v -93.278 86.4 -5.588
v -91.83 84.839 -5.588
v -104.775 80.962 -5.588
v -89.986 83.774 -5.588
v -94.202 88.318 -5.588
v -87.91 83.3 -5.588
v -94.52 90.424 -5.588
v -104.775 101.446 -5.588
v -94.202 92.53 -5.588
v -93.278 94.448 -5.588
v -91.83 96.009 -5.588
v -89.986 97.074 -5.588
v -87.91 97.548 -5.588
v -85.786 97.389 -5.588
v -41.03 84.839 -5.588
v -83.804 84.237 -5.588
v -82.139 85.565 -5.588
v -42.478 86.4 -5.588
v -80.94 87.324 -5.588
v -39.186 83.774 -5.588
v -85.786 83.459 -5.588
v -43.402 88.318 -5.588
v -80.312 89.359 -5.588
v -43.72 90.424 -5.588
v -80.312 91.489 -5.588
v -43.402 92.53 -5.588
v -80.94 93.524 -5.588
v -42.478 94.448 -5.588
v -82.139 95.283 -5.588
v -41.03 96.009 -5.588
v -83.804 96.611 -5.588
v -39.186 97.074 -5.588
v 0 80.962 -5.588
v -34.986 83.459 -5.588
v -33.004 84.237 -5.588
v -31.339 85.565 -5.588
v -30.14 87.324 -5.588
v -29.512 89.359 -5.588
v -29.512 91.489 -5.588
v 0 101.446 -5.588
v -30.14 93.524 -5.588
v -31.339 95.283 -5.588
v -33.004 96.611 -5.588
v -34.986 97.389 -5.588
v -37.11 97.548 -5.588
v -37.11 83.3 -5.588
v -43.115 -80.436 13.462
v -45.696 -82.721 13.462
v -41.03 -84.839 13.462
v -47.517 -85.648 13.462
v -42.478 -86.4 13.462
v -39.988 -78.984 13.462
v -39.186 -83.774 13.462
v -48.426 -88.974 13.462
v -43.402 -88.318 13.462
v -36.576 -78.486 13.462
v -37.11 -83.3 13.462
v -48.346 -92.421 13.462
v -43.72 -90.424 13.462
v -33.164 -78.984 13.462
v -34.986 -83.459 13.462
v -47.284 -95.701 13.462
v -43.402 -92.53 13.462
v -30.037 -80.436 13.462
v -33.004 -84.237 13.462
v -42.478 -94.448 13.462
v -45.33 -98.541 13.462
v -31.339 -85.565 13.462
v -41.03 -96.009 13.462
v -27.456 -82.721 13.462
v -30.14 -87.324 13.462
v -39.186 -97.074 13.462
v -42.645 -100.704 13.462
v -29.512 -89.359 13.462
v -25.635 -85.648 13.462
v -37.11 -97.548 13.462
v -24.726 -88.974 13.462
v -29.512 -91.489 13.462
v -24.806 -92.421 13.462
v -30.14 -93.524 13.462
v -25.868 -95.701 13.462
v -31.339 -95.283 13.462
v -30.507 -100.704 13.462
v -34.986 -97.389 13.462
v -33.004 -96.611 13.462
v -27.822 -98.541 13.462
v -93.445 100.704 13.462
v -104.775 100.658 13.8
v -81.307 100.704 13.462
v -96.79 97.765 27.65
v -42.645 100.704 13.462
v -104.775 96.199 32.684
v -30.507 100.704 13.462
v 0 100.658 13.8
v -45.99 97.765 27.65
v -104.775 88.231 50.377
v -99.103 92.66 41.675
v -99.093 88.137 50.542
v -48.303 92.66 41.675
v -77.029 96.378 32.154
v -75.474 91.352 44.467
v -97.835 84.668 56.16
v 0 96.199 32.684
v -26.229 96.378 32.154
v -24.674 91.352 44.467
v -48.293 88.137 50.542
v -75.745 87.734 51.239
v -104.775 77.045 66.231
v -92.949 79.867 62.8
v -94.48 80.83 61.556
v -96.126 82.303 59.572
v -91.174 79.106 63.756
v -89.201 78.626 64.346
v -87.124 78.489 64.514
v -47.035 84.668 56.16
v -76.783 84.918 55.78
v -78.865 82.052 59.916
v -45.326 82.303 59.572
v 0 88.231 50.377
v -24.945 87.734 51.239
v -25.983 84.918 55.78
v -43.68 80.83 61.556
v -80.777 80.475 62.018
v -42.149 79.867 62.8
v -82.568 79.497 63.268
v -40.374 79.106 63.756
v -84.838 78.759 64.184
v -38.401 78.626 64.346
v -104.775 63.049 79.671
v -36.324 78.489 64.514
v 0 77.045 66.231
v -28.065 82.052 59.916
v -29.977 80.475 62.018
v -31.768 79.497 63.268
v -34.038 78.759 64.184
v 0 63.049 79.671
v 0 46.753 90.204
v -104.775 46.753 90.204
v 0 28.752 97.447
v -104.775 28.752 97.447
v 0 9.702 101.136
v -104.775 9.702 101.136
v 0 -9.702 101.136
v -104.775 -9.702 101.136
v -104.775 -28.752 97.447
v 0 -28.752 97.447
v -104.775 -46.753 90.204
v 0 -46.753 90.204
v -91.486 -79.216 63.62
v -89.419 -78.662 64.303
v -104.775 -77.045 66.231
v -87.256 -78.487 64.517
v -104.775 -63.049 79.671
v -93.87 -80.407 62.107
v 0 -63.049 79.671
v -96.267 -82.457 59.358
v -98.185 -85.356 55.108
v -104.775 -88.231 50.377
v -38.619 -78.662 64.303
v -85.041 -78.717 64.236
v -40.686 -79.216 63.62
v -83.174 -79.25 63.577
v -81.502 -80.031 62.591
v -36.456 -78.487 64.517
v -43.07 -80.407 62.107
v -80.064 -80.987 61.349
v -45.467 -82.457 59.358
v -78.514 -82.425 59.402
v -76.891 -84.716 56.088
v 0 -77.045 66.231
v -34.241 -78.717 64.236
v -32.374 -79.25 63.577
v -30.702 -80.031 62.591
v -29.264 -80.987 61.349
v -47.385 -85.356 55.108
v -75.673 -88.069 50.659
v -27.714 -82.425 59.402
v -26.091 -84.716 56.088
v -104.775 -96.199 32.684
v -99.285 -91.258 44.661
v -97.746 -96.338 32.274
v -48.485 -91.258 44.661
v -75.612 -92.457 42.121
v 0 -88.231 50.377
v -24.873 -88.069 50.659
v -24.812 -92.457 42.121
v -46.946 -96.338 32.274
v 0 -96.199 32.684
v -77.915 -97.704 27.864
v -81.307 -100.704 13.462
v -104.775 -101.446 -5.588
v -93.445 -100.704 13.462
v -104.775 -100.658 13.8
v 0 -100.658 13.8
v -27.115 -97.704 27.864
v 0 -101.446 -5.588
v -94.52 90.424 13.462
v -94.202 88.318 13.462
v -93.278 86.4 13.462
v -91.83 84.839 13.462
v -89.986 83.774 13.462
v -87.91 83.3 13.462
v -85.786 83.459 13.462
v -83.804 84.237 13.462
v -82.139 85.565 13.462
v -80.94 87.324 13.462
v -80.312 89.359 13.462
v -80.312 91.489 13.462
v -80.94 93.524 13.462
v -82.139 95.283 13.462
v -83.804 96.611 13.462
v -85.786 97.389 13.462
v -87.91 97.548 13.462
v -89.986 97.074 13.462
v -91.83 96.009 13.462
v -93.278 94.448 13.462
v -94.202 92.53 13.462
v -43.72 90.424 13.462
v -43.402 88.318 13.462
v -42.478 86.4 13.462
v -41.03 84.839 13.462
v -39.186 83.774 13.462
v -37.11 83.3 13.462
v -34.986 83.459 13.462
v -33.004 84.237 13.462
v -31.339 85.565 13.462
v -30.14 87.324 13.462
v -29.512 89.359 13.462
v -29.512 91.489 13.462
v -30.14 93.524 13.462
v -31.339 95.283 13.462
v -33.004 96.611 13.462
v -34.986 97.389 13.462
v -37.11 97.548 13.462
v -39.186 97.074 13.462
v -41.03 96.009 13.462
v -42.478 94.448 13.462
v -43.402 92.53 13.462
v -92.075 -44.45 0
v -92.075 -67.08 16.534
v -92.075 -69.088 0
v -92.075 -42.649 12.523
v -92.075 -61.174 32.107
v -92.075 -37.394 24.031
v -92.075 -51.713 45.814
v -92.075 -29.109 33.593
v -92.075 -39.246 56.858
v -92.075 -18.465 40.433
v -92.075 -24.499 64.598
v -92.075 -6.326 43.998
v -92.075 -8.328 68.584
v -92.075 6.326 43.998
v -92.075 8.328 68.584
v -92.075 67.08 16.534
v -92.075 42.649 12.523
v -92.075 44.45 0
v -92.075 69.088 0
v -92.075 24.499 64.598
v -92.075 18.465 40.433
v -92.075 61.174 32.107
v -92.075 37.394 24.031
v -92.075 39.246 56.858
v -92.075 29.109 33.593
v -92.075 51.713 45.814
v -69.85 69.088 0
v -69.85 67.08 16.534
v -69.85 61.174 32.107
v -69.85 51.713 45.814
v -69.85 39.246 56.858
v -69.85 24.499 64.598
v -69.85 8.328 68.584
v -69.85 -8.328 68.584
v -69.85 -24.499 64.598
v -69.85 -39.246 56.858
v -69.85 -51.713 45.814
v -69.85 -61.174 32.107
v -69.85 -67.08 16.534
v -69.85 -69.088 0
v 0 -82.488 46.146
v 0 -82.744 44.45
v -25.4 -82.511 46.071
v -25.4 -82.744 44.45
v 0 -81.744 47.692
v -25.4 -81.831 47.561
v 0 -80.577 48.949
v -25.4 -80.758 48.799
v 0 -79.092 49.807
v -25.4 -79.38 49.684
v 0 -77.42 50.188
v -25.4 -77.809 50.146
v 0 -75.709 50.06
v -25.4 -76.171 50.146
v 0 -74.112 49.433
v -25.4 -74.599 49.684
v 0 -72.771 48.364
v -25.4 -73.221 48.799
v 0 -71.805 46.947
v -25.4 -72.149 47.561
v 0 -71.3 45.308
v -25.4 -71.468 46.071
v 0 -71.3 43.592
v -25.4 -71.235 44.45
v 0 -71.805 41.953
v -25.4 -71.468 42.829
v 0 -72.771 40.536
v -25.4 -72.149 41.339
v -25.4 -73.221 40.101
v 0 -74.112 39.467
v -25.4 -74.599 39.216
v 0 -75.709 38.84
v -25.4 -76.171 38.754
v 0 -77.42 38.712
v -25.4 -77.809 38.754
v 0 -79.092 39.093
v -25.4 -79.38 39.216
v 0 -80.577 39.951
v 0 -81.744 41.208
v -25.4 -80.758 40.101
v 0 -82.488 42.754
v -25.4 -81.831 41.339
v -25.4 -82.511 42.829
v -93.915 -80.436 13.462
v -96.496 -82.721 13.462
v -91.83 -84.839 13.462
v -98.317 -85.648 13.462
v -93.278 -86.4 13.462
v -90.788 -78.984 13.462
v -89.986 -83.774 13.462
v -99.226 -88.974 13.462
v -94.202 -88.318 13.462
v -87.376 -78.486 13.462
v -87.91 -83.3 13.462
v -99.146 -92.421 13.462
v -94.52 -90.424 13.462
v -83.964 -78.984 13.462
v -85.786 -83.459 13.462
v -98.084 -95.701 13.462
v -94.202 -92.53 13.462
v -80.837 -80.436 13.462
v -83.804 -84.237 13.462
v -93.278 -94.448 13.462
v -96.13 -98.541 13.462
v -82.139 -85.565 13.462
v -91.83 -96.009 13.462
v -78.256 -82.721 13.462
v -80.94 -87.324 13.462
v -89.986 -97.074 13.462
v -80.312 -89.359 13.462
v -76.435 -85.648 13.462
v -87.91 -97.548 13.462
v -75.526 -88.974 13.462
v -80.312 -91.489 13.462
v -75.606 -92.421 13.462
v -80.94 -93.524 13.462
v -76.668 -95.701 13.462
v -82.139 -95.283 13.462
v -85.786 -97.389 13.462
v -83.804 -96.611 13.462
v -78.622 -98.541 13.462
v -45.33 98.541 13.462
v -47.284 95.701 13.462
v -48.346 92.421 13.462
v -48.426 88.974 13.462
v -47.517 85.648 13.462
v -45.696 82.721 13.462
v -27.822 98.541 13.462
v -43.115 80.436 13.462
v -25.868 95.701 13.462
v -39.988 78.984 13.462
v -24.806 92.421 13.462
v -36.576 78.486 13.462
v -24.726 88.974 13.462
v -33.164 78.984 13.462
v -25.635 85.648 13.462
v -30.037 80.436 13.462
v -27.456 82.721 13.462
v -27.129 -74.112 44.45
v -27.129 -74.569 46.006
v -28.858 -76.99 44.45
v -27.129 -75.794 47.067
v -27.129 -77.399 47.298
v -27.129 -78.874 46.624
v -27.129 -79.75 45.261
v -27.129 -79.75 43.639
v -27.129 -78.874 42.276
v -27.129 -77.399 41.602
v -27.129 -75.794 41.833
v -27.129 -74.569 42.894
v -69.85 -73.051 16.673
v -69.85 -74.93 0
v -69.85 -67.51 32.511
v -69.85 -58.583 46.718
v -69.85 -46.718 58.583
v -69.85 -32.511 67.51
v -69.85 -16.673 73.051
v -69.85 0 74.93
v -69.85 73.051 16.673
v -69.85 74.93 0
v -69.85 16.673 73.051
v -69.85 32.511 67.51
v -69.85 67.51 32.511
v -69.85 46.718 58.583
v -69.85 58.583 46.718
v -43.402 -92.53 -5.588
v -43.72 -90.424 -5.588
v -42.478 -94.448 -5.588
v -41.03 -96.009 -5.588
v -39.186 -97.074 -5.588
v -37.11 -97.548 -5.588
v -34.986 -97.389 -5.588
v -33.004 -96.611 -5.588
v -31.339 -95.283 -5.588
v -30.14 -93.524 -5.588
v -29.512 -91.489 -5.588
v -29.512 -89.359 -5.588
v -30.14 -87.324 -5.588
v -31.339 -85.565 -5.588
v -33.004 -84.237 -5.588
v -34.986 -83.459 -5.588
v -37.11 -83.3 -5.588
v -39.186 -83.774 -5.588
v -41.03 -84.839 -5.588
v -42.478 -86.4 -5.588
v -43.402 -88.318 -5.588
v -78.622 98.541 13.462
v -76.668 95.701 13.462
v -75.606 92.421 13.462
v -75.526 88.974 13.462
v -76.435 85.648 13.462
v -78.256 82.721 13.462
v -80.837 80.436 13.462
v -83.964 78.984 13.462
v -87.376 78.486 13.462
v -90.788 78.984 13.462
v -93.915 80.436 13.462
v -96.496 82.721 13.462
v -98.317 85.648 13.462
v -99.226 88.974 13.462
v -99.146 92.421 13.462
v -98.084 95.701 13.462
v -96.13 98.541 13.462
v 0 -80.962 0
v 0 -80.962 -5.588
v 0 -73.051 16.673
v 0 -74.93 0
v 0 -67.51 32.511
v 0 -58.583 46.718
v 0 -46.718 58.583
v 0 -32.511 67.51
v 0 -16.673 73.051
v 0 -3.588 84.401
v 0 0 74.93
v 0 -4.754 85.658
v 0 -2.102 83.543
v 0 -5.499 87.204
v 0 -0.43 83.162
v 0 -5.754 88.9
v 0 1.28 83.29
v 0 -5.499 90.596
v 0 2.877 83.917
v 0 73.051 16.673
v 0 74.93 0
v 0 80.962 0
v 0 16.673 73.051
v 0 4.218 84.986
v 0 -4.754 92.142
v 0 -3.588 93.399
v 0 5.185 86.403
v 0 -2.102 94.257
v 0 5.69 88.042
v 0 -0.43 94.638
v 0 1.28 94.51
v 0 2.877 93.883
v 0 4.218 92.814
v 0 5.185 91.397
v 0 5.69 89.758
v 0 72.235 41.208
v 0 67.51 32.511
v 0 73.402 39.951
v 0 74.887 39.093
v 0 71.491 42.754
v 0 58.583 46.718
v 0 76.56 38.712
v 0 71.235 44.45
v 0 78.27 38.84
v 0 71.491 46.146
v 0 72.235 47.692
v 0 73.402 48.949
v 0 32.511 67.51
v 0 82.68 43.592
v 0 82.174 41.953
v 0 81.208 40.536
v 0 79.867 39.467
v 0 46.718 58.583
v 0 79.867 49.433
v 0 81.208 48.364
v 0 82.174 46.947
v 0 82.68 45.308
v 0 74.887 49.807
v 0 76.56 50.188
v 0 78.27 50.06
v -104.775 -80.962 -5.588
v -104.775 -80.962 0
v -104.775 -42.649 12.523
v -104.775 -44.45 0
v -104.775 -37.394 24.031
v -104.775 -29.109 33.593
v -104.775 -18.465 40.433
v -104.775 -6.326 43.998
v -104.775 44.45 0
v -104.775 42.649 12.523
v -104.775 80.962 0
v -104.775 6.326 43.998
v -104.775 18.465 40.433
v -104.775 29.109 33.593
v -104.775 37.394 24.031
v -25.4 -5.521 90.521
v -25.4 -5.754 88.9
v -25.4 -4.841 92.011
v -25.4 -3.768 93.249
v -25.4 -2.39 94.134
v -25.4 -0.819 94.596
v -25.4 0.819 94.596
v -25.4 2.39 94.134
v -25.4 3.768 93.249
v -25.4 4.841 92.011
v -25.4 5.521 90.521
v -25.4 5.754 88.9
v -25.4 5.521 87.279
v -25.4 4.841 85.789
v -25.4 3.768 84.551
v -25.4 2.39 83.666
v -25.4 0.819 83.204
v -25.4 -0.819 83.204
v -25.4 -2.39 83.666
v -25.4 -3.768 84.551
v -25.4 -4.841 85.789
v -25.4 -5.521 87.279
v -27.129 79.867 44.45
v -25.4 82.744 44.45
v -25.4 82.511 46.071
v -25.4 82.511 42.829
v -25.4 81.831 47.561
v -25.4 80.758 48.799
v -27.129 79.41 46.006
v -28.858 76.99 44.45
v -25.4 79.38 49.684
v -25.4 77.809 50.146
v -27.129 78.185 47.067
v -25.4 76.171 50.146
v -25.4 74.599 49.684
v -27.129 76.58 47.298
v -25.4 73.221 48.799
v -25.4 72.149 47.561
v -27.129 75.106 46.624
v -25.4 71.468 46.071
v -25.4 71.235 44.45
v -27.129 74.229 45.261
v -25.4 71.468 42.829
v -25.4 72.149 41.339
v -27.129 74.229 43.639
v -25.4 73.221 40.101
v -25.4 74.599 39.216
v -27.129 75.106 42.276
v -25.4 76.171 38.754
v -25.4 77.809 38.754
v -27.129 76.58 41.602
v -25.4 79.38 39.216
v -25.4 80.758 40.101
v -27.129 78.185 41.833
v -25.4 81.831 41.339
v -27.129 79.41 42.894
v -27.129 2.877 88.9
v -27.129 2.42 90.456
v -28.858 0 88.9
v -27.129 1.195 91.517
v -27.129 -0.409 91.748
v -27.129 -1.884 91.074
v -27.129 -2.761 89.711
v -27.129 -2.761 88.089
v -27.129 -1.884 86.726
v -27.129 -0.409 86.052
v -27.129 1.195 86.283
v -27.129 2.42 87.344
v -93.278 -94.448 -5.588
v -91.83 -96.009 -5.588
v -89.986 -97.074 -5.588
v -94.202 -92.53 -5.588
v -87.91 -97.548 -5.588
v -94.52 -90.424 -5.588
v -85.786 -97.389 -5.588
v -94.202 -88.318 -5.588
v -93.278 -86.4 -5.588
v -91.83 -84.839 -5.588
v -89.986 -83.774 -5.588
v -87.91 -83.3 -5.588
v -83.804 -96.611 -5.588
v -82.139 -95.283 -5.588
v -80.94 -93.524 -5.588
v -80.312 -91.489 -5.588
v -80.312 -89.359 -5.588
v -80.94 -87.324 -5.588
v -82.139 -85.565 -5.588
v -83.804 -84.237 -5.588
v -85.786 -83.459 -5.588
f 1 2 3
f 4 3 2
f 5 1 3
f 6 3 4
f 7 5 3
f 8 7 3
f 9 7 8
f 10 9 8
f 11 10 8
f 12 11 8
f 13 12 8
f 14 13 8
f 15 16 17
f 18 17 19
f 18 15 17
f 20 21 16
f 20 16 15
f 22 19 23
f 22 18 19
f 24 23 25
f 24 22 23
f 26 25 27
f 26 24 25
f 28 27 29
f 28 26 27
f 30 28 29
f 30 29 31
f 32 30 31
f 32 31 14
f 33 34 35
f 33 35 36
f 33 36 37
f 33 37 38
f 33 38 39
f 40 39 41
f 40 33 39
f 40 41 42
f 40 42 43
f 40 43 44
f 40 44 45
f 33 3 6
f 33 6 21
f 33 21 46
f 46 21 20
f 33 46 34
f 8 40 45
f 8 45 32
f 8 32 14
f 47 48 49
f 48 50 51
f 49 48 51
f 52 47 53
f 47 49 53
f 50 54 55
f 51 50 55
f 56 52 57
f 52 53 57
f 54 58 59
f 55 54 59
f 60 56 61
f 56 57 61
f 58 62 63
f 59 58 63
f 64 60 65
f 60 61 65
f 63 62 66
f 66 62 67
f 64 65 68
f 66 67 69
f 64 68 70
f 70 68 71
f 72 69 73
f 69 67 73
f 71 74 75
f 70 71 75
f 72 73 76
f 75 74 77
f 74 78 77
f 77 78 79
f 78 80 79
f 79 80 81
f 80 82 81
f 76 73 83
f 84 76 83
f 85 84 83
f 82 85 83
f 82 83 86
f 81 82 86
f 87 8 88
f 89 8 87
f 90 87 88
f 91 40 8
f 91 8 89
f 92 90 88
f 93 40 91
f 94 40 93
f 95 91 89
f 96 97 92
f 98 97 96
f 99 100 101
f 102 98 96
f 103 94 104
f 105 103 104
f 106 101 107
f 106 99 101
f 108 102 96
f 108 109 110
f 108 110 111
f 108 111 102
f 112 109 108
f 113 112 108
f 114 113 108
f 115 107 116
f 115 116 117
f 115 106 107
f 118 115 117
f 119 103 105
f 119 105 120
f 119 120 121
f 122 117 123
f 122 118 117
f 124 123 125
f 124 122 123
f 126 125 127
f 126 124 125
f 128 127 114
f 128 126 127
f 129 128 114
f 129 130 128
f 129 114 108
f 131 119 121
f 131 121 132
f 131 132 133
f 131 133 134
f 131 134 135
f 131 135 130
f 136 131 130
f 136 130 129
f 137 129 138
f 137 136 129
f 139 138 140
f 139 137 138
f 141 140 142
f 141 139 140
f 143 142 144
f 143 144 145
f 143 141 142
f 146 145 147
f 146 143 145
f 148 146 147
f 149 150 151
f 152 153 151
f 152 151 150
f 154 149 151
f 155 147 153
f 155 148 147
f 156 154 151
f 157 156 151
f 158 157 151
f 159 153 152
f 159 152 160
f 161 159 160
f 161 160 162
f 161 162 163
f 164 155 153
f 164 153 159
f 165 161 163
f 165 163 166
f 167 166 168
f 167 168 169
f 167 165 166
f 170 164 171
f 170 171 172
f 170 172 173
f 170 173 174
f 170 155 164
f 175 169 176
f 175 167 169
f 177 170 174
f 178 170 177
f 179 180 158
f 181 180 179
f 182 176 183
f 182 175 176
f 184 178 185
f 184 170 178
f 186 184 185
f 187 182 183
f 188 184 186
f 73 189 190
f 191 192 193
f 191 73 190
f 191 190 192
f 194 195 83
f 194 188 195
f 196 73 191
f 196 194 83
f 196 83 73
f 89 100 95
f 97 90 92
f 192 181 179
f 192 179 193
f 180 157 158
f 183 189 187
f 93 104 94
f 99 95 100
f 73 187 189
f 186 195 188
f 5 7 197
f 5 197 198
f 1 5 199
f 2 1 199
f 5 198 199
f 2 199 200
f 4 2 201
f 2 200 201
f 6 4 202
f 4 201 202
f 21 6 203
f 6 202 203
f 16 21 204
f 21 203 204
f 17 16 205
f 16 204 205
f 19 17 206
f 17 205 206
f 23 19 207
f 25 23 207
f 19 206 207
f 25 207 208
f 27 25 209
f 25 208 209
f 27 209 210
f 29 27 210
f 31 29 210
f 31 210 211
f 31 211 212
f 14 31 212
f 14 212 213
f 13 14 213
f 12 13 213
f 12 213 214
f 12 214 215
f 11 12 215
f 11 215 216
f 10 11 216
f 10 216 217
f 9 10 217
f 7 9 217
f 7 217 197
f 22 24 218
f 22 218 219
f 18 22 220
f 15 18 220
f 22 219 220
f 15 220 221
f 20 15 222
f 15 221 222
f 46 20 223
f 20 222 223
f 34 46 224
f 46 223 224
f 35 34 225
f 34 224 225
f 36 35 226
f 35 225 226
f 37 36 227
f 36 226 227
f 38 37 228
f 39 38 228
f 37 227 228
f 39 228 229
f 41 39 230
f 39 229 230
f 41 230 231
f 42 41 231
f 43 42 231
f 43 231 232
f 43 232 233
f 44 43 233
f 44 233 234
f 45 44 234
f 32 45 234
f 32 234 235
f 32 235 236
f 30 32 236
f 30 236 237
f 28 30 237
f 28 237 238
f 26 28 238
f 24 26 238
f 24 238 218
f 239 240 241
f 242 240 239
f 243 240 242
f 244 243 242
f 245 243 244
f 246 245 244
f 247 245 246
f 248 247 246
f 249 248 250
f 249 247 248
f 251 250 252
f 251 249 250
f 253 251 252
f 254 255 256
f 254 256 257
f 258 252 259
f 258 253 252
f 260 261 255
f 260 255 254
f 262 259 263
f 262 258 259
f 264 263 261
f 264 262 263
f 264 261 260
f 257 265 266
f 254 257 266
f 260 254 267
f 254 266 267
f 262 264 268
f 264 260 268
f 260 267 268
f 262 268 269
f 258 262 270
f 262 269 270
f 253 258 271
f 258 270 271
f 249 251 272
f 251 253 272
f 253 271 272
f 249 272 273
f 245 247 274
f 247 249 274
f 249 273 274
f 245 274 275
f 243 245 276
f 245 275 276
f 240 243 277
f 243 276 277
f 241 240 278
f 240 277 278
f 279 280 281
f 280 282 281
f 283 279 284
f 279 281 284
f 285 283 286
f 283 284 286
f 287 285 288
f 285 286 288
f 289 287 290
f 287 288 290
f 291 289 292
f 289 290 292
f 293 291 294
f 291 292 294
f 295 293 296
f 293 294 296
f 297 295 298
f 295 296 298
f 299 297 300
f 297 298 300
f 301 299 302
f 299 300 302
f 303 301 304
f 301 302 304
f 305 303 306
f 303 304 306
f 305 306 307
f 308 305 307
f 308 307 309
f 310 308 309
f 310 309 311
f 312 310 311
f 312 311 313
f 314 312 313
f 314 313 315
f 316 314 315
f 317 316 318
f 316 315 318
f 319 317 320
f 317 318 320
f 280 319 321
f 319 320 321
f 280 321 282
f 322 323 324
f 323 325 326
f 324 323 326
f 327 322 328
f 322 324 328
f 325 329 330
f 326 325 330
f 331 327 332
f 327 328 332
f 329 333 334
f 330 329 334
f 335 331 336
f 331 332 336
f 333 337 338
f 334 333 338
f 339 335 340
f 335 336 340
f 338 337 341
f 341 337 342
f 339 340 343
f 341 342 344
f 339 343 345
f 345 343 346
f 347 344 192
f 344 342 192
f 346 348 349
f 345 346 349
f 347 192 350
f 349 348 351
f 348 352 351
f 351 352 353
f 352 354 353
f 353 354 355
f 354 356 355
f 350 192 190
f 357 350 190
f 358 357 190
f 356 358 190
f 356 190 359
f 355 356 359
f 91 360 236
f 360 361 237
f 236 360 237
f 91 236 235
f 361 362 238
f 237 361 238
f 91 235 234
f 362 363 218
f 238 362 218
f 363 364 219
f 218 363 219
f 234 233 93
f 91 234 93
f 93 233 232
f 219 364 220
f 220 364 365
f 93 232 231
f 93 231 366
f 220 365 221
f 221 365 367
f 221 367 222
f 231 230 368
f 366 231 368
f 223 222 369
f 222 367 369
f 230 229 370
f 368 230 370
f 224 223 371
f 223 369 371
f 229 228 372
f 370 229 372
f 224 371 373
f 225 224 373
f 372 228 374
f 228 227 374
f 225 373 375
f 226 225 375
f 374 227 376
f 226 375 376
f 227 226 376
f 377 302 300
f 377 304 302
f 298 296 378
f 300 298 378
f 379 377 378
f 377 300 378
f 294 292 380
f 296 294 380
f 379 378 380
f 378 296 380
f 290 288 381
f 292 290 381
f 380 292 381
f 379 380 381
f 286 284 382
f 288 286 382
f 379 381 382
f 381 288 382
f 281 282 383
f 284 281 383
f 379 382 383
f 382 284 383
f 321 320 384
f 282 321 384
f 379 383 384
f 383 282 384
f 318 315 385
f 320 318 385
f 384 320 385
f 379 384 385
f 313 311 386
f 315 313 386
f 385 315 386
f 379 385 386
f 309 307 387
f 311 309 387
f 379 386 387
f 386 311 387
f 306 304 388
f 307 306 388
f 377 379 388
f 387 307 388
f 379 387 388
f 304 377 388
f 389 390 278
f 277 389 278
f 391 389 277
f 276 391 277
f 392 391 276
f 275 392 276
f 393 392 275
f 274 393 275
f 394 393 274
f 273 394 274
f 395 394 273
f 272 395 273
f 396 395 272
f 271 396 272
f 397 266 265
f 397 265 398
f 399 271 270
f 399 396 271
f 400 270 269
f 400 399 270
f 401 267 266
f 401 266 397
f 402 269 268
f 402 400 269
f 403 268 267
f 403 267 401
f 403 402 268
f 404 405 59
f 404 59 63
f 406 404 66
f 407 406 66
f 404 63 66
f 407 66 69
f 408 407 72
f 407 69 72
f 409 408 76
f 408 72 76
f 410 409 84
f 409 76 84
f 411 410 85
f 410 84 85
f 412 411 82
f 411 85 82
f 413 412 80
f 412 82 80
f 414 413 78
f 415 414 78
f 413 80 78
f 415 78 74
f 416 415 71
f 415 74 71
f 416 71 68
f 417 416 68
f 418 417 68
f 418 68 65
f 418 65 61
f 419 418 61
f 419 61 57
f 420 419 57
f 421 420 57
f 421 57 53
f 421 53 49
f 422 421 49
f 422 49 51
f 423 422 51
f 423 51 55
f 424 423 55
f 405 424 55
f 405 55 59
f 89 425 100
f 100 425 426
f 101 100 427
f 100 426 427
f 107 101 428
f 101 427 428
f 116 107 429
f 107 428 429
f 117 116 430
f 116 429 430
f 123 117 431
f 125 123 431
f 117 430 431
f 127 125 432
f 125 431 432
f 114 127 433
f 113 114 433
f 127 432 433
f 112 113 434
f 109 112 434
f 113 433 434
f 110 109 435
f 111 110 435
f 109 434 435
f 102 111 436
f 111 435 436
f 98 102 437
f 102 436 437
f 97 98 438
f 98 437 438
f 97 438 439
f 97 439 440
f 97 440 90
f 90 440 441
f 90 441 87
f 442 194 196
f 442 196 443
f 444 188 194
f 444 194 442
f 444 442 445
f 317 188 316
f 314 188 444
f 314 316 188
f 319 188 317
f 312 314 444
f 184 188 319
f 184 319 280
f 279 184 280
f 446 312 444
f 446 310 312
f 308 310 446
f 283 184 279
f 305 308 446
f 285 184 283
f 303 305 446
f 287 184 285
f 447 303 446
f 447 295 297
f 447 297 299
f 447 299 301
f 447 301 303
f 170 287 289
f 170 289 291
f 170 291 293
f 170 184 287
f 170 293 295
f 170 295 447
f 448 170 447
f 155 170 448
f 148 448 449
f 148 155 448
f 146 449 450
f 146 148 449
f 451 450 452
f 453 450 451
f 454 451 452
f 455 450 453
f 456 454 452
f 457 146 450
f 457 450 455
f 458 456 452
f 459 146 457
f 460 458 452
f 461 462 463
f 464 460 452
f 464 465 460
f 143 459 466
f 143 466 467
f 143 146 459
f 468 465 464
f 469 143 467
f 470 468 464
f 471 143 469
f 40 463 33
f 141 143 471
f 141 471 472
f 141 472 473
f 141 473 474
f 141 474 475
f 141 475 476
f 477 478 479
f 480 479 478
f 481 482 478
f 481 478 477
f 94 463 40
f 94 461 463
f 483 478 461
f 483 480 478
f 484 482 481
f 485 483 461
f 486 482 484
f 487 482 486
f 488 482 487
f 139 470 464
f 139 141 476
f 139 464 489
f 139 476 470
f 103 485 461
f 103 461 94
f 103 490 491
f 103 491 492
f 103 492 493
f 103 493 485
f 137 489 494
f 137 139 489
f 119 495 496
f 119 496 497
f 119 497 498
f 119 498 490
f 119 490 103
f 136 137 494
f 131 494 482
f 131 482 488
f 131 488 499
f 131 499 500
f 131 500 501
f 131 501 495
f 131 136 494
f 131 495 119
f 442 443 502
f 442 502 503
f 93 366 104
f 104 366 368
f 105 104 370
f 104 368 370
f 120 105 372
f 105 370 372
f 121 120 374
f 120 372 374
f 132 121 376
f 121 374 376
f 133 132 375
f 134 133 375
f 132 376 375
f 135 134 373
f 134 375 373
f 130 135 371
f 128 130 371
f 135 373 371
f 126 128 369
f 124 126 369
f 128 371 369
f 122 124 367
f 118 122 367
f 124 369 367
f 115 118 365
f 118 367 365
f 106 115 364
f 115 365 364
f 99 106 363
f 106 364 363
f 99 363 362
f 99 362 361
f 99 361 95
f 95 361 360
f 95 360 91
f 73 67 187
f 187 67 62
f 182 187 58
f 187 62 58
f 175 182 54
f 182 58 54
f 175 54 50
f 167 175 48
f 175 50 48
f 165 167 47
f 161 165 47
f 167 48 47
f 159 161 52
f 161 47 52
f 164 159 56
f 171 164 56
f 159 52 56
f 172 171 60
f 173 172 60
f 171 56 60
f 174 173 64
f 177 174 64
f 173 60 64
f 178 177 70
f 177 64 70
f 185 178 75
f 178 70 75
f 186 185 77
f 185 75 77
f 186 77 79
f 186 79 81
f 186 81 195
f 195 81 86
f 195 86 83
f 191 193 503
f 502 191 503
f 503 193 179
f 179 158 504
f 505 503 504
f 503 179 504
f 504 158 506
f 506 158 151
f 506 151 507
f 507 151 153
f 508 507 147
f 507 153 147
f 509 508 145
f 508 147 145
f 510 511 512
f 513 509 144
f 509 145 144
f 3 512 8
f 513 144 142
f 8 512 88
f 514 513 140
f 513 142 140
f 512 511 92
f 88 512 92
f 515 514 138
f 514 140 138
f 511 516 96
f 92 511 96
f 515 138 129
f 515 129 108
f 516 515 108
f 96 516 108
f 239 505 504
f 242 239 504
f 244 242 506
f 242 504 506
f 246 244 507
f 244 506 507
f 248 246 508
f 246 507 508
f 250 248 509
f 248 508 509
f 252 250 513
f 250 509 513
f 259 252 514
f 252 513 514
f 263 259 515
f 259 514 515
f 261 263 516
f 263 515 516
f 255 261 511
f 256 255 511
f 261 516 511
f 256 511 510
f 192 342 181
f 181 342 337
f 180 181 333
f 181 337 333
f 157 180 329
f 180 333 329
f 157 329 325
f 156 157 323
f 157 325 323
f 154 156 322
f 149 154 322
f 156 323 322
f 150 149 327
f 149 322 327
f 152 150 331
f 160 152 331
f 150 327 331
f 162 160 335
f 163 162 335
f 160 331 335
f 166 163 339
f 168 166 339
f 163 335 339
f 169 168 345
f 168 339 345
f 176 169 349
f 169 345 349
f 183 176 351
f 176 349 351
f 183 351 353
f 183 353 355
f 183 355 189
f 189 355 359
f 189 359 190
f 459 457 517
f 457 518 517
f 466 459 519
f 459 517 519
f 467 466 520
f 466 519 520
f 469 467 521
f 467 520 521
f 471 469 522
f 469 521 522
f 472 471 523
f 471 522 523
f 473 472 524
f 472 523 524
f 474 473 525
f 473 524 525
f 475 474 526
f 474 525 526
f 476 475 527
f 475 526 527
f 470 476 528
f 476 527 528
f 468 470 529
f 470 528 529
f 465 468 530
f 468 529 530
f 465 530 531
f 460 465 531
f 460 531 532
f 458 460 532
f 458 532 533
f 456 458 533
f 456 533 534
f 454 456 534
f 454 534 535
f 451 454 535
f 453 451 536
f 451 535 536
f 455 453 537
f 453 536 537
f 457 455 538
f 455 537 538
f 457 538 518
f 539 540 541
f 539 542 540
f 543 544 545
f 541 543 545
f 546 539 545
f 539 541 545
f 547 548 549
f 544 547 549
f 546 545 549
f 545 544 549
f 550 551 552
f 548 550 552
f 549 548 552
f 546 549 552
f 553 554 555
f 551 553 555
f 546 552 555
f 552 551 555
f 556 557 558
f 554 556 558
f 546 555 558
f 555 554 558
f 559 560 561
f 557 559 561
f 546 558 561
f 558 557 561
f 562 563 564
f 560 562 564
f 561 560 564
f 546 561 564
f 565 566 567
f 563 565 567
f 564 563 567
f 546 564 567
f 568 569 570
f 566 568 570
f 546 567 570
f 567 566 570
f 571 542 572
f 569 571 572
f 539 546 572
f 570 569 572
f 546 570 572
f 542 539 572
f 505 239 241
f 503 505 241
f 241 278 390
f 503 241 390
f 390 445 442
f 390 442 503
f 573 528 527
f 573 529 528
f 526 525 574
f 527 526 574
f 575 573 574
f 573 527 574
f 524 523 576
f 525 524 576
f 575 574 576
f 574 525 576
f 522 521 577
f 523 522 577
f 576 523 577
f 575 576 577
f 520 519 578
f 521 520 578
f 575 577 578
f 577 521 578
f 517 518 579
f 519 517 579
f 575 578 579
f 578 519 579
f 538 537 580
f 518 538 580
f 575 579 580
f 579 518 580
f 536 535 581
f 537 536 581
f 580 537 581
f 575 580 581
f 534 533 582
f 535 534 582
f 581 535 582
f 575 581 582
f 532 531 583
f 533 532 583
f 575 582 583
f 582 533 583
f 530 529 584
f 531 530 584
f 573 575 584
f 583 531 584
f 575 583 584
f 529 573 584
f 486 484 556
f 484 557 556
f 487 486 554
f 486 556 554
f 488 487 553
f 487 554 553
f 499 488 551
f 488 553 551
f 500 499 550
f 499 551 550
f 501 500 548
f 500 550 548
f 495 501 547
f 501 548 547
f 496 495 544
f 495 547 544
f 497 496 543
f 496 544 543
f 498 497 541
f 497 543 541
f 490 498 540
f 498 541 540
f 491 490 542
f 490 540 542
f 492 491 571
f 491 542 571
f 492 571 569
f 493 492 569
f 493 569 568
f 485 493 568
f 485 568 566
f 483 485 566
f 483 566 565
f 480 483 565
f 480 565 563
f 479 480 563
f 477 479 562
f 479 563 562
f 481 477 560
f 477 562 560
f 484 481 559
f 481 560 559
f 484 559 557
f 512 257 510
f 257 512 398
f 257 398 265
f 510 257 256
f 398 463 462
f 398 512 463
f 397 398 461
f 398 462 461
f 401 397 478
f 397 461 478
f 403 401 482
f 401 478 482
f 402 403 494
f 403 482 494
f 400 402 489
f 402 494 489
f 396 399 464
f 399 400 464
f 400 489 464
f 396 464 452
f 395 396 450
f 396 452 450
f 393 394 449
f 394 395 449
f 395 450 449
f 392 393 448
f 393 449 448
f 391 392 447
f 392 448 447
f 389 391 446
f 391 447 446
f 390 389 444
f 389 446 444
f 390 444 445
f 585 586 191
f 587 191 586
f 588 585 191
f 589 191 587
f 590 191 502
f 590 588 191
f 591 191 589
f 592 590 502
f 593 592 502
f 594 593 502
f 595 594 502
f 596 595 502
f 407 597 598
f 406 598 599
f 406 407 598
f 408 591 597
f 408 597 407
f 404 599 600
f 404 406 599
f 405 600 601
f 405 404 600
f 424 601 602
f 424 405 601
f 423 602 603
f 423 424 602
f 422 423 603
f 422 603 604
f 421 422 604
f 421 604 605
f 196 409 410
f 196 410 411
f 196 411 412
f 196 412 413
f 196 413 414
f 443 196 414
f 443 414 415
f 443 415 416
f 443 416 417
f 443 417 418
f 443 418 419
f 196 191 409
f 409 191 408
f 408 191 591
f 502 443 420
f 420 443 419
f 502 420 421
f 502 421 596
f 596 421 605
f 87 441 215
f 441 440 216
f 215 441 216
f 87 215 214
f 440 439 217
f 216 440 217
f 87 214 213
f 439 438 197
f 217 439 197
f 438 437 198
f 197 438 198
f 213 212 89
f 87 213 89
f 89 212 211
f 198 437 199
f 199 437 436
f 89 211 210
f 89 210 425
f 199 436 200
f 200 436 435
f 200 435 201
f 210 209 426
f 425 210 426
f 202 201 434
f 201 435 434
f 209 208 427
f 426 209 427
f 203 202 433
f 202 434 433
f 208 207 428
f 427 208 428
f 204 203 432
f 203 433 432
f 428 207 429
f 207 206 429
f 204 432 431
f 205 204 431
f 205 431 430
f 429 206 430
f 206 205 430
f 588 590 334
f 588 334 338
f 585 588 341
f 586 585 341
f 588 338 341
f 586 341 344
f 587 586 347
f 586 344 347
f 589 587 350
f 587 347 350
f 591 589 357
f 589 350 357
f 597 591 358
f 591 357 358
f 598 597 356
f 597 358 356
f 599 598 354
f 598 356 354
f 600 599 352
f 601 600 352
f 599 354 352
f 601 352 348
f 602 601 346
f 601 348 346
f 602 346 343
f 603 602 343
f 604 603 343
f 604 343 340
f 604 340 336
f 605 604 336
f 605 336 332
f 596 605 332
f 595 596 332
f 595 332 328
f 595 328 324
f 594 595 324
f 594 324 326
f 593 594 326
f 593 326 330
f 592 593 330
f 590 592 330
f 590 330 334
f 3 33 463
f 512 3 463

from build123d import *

# Parameters (mm, degrees)
F0_R           = 101.6
F1_DEPTH       = 104.775
F3_D           = 88.9
F3_CBORE_D     = 138.176
F3_CBORE_DEPTH = 92.075
F4_R           = 74.93
F5_DEPTH       = 69.85
F6_W           = 288.5075062513
F6_H           = 97.8503401275
F7_DEPTH       = 104.776
F8_W           = 80.9625
F8_H           = 28.0255991966
F9_DEPTH       = 104.776
F11_D          = 14.2875
F13_R          = 11.938
F14_DEPTH      = 88.1390001
F16_D          = 11.50874
F16_DEPTH      = 25.4
F16_TIP        = 3.4575743203


# Not quite as in the source:
# - a length typed as a fraction of an inch, garbled in the dataset ("3 / 203.2 mm" for 3/8 in), is restored


with BuildPart() as f1:
    # F0 (on Right) → F1 (new body)
    with BuildSketch(Plane.YZ):
        Circle(F0_R)
    extrude(amount=-F1_DEPTH)

    # F3 (through all)
    with Locations(Plane.YZ):
        with Locations((0, 0)):
            CounterBoreHole(F3_D / 2, F3_CBORE_D / 2, F3_CBORE_DEPTH)

    # F4 (on face) → F5 (cut)
    with BuildSketch(Plane.YZ):
        Circle(F4_R)
    extrude(amount=-F5_DEPTH, mode=Mode.SUBTRACT)

    # F6 (on face) → F7 (cut, through all)
    with BuildSketch(Plane.YZ):
        with Locations((9.2829242349, -54.5131700637)):
            Rectangle(F6_W, F6_H)
    extrude(amount=-F7_DEPTH, mode=Mode.SUBTRACT)

    # F8 (on face) → F9 (cut, through all)
    with BuildSketch(Plane.YZ):
        with Locations((-40.48125, -14.0127995983)):
            Rectangle(F8_W, F8_H)
        with Locations((40.48125, -14.0127995983)):
            Rectangle(F8_W, F8_H)
    extrude(amount=-F9_DEPTH, mode=Mode.SUBTRACT)

    # F11 (through all)
    with Locations(Plane(origin=(0, 0, -5.588), x_dir=(1, 0, 0), z_dir=(0, 0, -1))):
        with Locations((-36.576, 90.424), (-87.376, 90.424), (-36.576, -90.424), (-87.376, -90.424)):
            Hole(F11_D / 2)

    # F13 (on offset) → F14 (cut, through all)
    with BuildSketch(Plane(origin=(0, 0, 13.462), x_dir=(1, 0, 0), z_dir=(0, 0, -1))):
        with Locations((-87.376, 90.424)):
            Circle(F13_R)
        with Locations((-36.576, 90.424)):
            Circle(F13_R)
        with Locations((-87.376, -90.424)):
            Circle(F13_R)
        with Locations((-36.576, -90.424)):
            Circle(F13_R)
    extrude(amount=-F14_DEPTH, mode=Mode.SUBTRACT)

    # F16
    with Locations(Plane.YZ):
        with Locations((-76.9896583964, 44.45), (0, 88.9), (76.9896583964, 44.45)):
            Hole(F16_D / 2, depth=F16_DEPTH)
            with Locations((0, 0, -(F16_DEPTH + F16_TIP / 2))):  # 118° drill point
                Cone(0, F16_D / 2, F16_TIP, mode=Mode.SUBTRACT)


solid = f1.part
